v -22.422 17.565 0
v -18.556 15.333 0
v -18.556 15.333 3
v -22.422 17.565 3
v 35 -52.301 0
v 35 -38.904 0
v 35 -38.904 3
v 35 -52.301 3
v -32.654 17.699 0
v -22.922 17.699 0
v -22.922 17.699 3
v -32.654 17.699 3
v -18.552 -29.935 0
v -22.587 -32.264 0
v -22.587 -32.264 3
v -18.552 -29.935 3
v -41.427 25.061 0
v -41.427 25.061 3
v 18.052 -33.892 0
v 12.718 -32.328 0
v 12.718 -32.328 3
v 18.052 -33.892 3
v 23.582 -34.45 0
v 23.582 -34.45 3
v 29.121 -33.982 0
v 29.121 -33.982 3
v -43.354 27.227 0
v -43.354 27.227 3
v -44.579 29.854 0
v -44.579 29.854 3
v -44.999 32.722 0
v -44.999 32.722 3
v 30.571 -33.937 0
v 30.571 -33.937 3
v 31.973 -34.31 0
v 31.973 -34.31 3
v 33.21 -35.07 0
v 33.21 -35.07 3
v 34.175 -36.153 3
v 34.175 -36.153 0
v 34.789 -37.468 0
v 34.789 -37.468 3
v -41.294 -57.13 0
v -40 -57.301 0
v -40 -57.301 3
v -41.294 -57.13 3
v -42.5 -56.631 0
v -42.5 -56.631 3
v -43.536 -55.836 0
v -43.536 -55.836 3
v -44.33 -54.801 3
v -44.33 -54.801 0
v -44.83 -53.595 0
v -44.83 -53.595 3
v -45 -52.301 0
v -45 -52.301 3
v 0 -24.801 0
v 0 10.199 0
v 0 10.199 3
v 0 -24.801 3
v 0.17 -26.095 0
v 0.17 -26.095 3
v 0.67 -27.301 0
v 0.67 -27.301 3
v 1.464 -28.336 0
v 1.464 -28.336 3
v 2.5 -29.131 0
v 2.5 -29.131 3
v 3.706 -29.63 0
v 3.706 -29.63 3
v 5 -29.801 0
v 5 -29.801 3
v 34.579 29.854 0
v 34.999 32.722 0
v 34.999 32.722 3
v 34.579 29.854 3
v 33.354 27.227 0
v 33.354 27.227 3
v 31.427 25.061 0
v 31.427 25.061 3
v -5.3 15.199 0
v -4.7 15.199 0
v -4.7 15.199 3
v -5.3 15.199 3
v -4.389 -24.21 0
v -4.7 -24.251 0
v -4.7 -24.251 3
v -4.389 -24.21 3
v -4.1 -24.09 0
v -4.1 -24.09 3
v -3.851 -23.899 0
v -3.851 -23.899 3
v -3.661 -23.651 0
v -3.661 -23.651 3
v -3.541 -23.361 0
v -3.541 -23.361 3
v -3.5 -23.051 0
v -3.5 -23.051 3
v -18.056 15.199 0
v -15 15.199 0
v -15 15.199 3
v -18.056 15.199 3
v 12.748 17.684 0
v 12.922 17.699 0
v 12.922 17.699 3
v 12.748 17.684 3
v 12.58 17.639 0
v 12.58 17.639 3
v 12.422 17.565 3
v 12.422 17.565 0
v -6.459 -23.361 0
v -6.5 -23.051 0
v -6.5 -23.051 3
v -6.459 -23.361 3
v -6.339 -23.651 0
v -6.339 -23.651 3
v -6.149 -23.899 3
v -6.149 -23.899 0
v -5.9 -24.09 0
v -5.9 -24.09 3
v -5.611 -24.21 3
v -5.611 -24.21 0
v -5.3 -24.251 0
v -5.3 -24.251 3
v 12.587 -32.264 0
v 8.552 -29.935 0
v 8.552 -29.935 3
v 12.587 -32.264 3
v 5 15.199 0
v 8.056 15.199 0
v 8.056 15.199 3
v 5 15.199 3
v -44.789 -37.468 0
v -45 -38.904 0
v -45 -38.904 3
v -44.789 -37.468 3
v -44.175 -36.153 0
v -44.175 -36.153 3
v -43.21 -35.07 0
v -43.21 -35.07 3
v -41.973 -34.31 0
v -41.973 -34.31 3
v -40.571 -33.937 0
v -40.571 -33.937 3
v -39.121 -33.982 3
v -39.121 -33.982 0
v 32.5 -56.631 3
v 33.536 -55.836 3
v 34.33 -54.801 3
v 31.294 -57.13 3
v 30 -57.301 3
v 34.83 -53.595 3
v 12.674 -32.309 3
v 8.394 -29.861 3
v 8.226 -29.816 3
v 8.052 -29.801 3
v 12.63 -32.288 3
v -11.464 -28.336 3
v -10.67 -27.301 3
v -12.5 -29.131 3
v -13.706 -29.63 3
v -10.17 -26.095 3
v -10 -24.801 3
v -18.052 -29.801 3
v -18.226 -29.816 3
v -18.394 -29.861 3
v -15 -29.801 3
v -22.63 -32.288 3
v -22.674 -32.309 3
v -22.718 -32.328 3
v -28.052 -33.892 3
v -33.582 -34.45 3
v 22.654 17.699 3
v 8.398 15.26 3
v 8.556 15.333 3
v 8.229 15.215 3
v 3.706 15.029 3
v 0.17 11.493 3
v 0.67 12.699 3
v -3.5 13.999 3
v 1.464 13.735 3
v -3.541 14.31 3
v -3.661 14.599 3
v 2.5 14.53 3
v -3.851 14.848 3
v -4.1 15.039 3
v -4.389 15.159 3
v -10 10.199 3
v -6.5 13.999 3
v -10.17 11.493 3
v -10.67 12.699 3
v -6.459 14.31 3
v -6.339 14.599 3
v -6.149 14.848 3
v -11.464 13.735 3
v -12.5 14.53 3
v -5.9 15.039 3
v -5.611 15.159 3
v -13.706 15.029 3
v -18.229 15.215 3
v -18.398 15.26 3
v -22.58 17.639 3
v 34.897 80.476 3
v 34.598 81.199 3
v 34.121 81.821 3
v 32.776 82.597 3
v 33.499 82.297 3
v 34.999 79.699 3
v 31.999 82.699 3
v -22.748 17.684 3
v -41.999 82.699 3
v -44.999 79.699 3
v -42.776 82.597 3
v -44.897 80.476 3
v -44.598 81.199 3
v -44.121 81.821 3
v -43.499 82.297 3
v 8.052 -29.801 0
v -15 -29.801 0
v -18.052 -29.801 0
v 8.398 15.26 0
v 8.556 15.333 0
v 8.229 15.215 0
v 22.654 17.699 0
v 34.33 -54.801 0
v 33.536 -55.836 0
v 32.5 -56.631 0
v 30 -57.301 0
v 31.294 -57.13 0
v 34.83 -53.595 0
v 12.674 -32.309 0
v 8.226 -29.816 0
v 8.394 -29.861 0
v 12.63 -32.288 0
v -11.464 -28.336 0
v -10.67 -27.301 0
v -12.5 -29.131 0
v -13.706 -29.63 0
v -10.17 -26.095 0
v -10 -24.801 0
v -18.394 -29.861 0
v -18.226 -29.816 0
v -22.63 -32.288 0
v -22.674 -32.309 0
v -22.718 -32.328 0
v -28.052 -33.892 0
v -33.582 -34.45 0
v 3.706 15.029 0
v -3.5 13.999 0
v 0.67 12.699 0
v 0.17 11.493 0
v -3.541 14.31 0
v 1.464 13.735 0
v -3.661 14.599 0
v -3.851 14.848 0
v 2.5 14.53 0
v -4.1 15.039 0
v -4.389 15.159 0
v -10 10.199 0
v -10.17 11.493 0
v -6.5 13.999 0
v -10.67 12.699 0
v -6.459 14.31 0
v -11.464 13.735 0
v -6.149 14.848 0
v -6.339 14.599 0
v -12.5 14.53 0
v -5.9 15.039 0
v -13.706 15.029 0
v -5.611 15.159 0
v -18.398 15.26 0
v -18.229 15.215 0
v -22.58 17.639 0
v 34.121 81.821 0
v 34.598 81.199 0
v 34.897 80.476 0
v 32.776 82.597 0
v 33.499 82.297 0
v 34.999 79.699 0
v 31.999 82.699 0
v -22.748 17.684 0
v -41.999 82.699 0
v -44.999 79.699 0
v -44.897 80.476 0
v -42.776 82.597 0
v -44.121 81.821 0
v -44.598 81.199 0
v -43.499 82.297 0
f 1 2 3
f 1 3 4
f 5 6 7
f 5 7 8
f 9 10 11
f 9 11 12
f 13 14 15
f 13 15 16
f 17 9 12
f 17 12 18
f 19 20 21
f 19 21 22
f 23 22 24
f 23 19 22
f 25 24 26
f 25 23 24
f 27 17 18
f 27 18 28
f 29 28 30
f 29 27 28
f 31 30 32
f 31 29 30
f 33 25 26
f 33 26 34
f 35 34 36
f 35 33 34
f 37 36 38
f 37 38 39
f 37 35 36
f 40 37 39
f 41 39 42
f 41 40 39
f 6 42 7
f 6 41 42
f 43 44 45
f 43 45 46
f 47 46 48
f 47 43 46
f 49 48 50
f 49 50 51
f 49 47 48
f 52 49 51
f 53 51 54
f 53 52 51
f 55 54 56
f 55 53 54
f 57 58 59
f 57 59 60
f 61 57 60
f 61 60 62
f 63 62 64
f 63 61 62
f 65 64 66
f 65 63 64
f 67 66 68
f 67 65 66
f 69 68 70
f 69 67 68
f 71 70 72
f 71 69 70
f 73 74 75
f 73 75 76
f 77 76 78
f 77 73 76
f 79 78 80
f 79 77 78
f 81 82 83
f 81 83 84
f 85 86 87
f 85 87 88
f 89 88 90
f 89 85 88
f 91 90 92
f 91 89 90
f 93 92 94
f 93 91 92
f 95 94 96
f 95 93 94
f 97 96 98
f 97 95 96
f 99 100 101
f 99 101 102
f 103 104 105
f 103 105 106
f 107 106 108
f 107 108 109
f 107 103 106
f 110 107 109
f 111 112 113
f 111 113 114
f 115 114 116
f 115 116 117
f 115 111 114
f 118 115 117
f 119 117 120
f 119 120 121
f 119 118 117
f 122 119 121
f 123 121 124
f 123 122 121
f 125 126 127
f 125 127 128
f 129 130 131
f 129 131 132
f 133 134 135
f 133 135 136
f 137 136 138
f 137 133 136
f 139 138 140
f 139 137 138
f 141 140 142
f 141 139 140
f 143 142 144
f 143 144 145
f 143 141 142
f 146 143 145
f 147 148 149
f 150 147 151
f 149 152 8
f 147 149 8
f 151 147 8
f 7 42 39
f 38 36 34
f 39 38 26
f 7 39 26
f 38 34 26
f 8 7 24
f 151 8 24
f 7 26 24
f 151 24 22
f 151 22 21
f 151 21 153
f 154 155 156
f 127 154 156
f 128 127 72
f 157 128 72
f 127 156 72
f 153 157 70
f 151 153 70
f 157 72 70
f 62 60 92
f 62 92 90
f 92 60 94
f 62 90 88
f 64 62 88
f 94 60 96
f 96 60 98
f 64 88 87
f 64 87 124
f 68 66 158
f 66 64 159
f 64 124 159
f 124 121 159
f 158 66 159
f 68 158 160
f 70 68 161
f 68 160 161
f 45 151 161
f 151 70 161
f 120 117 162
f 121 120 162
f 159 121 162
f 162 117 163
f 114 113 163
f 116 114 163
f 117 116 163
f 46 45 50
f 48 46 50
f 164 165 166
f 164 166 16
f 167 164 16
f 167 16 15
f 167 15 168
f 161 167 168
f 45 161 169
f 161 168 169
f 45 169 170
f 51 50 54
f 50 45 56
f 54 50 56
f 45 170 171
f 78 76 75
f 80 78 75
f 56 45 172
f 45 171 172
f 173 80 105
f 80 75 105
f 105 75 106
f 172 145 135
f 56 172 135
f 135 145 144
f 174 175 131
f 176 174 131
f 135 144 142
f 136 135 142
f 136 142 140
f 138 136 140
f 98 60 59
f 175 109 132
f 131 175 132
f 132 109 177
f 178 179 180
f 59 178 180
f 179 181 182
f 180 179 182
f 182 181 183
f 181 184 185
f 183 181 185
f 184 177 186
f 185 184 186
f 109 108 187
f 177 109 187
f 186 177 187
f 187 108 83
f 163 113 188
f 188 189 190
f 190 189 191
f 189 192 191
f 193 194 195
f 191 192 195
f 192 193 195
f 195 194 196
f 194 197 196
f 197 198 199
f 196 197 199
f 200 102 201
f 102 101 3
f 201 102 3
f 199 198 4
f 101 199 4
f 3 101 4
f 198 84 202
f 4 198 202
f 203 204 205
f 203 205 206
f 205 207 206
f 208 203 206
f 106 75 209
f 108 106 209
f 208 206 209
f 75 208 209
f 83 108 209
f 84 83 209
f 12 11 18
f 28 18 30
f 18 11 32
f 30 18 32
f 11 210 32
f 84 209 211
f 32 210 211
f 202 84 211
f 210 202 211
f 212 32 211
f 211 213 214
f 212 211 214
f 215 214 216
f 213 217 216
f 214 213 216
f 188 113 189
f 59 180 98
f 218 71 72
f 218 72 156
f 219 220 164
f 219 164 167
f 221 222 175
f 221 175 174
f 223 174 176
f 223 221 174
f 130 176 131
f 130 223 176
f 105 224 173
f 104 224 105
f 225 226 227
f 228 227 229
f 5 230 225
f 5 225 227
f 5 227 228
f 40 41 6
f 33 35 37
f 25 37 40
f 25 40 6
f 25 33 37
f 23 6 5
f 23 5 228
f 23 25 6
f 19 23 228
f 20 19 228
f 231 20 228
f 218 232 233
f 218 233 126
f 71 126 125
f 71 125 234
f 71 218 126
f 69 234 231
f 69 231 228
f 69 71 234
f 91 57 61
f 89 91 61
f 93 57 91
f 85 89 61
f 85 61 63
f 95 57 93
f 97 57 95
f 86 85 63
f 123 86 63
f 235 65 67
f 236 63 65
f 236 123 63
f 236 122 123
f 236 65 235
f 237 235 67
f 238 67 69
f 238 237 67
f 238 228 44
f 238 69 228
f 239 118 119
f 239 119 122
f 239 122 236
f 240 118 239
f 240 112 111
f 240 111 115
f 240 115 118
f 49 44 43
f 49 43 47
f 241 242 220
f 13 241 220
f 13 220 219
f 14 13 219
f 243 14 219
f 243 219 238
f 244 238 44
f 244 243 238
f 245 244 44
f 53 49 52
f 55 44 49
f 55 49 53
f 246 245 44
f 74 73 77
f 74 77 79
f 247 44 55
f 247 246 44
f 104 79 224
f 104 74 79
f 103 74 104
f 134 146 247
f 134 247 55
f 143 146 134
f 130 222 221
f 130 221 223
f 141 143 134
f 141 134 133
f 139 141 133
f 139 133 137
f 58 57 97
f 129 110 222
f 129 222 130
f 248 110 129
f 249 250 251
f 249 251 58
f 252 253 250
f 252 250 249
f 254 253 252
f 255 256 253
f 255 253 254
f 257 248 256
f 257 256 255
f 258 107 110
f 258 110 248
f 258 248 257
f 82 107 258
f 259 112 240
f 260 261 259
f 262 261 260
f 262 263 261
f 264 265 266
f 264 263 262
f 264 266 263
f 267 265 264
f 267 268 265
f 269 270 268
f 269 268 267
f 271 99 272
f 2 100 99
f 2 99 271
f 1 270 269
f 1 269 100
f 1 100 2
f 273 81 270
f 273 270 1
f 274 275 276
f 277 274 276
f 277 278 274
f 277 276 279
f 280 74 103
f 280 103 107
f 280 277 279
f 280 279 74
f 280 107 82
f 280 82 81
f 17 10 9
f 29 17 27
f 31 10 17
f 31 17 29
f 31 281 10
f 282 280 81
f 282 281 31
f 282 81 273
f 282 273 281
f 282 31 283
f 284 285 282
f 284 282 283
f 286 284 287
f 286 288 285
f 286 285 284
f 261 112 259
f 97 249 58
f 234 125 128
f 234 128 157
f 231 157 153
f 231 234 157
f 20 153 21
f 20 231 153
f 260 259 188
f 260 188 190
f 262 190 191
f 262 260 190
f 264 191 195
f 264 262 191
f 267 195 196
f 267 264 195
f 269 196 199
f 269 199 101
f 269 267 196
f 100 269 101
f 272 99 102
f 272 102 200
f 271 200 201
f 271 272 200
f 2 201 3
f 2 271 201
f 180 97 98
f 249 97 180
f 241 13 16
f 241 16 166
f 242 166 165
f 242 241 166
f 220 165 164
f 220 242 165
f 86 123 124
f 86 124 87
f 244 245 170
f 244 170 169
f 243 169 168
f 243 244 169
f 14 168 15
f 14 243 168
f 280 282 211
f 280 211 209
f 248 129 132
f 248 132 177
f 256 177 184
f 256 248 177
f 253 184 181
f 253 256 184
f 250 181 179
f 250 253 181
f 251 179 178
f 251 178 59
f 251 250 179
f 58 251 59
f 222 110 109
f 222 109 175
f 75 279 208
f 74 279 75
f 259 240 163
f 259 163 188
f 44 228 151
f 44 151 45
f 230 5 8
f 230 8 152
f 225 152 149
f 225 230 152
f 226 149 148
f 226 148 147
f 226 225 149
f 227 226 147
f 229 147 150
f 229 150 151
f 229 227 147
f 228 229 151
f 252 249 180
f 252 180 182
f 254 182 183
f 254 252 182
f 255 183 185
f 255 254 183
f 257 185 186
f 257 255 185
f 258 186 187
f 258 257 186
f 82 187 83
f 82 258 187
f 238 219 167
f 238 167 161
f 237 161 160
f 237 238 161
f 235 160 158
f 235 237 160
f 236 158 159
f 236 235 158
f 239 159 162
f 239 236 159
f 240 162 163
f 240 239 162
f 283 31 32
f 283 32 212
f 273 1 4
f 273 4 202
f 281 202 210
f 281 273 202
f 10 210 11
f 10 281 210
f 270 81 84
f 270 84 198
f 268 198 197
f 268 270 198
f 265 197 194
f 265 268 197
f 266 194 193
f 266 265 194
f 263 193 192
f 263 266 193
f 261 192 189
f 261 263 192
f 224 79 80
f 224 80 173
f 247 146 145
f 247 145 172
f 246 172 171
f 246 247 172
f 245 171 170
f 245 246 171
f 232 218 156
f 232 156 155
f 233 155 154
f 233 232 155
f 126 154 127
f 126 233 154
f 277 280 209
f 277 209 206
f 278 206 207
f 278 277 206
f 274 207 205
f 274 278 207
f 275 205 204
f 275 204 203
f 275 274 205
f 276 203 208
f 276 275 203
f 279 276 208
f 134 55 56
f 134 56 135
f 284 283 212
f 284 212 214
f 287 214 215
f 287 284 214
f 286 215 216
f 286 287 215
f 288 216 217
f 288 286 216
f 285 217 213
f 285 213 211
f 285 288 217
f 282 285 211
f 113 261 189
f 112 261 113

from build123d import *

# Parameters (mm, degrees)
RESSALTO_EXTRUS_O4_DEPTH = 3
CORTE_EXTRUS_O1_DEPTH    = 3


with BuildPart() as part:
    # Esboço2 → Ressalto-extrusão4 (new body)
    with BuildSketch(Plane.XY):
        with BuildLine():
            Line((31.427362324, 25.061276238), (22.653821271, 17.699401176))
            Line((22.653821271, 17.699401176), (12.921770463, 17.699401176))
            ThreePointArc((12.921770463, 17.699401176), (12.662951418, 17.665327003), (12.421770463, 17.56542658))
            Line((12.421770463, 17.56542658), (8.55574506, 15.333375773))
            ThreePointArc((8.55574506, 15.333375773), (8.314564105, 15.23347535), (8.05574506, 15.199401176))
            Line((8.05574506, 15.199401176), (5, 15.199401176))
            ThreePointArc((5, 15.199401176), (1.464466094, 13.734935082), (0, 10.199401176))
            Line((0, 10.199401176), (0, -24.800598824))
            ThreePointArc((0, -24.800598824), (1.464466094, -28.33613273), (5, -29.800598824))
            Line((5, -29.800598824), (8.051923789, -29.800598824))
            ThreePointArc((8.051923789, -29.800598824), (8.310742834, -29.834672997), (8.551923789, -29.93457342))
            Line((8.551923789, -29.93457342), (12.587284274, -32.264389882))
            ThreePointArc((12.587284274, -32.264389882), (12.651697156, -32.298511057), (12.718424432, -32.327849506))
            ThreePointArc((12.718424432, -32.327849506), (20.804137446, -34.299176341), (29.120634875, -33.981757168))
            ThreePointArc((29.120634875, -33.981757168), (33.209608572, -35.069970557), (35, -38.903821469))
            Line((35, -38.903821469), (35, -52.300598824))
            ThreePointArc((35, -52.300598824), (33.535533906, -55.83613273), (30, -57.300598824))
            Line((30, -57.300598824), (-40, -57.300598824))
            ThreePointArc((-40, -57.300598824), (-43.535533906, -55.83613273), (-45, -52.300598824))
            Line((-45, -52.300598824), (-45, -38.903821469))
            ThreePointArc((-45, -38.903821469), (-43.209608572, -35.069970557), (-39.120634875, -33.981757168))
            ThreePointArc((-39.120634875, -33.981757168), (-30.804137446, -34.299176341), (-22.718424432, -32.327849506))
            ThreePointArc((-22.718424432, -32.327849506), (-22.651697156, -32.298511057), (-22.587284274, -32.264389882))
            Line((-22.587284274, -32.264389882), (-18.551923789, -29.93457342))
            ThreePointArc((-18.551923789, -29.93457342), (-18.310742834, -29.834672997), (-18.051923789, -29.800598824))
            Line((-18.051923789, -29.800598824), (-15, -29.800598824))
            ThreePointArc((-15, -29.800598824), (-11.464466094, -28.33613273), (-10, -24.800598824))
            Line((-10, -24.800598824), (-10, 10.199401176))
            ThreePointArc((-10, 10.199401176), (-11.464466094, 13.734935082), (-15, 15.199401176))
            Line((-15, 15.199401176), (-18.05574506, 15.199401176))
            ThreePointArc((-18.05574506, 15.199401176), (-18.314564105, 15.23347535), (-18.55574506, 15.333375773))
            Line((-18.55574506, 15.333375773), (-22.421770463, 17.56542658))
            ThreePointArc((-22.421770463, 17.56542658), (-22.662951418, 17.665327003), (-22.921770463, 17.699401176))
            Line((-22.921770463, 17.699401176), (-32.653821271, 17.699401176))
            Line((-32.653821271, 17.699401176), (-41.427362324, 25.061276238))
            ThreePointArc((-41.427362324, 25.061276238), (-44.062564097, 28.495538052), (-44.999486227, 32.721720669))
            Line((-44.999486227, 32.721720669), (-44.999486227, 77.699401176))
            Line((-44.999486227, 77.699401176), (-44.999486227, 79.699401176))
            ThreePointArc((-44.999486227, 79.699401176), (-44.12080657, 81.82072152), (-41.999486227, 82.699401176))
            Line((-41.999486227, 82.699401176), (-39.999486227, 82.699401176))
            Line((-39.999486227, 82.699401176), (29.999486227, 82.699401176))
            Line((29.999486227, 82.699401176), (31.999486227, 82.699401176))
            ThreePointArc((31.999486227, 82.699401176), (34.12080657, 81.82072152), (34.999486227, 79.699401176))
            Line((34.999486227, 79.699401176), (34.999486227, 77.699401176))
            Line((34.999486227, 77.699401176), (34.999486227, 32.721720669))
            ThreePointArc((34.999486227, 32.721720669), (34.062564097, 28.495538052), (31.427362324, 25.061276238))
        make_face()
    extrude(amount=RESSALTO_EXTRUS_O4_DEPTH)

    # Esboço3 → Corte-extrusão1 (cut)
    with BuildSketch(Plane(origin=(0, 0, 0), x_dir=(-1, 0, 0), z_dir=(0, 0, -1))):
        with BuildLine():
            Line((4.7, 15.199401176), (5.3, 15.199401176))
            ThreePointArc((5.3, 15.199401176), (6.148528137, 14.847929314), (6.5, 13.999401176))
            Line((6.5, 13.999401176), (6.5, -23.050598824))
            ThreePointArc((6.5, -23.050598824), (6.148528137, -23.899126961), (5.3, -24.250598824))
            Line((5.3, -24.250598824), (4.7, -24.250598824))
            ThreePointArc((4.7, -24.250598824), (3.851471863, -23.899126961), (3.5, -23.050598824))
            Line((3.5, -23.050598824), (3.5, 13.999401176))
            ThreePointArc((3.5, 13.999401176), (3.851471863, 14.847929314), (4.7, 15.199401176))
        make_face()
    extrude(amount=-CORTE_EXTRUS_O1_DEPTH, mode=Mode.SUBTRACT)


solid = part.part
